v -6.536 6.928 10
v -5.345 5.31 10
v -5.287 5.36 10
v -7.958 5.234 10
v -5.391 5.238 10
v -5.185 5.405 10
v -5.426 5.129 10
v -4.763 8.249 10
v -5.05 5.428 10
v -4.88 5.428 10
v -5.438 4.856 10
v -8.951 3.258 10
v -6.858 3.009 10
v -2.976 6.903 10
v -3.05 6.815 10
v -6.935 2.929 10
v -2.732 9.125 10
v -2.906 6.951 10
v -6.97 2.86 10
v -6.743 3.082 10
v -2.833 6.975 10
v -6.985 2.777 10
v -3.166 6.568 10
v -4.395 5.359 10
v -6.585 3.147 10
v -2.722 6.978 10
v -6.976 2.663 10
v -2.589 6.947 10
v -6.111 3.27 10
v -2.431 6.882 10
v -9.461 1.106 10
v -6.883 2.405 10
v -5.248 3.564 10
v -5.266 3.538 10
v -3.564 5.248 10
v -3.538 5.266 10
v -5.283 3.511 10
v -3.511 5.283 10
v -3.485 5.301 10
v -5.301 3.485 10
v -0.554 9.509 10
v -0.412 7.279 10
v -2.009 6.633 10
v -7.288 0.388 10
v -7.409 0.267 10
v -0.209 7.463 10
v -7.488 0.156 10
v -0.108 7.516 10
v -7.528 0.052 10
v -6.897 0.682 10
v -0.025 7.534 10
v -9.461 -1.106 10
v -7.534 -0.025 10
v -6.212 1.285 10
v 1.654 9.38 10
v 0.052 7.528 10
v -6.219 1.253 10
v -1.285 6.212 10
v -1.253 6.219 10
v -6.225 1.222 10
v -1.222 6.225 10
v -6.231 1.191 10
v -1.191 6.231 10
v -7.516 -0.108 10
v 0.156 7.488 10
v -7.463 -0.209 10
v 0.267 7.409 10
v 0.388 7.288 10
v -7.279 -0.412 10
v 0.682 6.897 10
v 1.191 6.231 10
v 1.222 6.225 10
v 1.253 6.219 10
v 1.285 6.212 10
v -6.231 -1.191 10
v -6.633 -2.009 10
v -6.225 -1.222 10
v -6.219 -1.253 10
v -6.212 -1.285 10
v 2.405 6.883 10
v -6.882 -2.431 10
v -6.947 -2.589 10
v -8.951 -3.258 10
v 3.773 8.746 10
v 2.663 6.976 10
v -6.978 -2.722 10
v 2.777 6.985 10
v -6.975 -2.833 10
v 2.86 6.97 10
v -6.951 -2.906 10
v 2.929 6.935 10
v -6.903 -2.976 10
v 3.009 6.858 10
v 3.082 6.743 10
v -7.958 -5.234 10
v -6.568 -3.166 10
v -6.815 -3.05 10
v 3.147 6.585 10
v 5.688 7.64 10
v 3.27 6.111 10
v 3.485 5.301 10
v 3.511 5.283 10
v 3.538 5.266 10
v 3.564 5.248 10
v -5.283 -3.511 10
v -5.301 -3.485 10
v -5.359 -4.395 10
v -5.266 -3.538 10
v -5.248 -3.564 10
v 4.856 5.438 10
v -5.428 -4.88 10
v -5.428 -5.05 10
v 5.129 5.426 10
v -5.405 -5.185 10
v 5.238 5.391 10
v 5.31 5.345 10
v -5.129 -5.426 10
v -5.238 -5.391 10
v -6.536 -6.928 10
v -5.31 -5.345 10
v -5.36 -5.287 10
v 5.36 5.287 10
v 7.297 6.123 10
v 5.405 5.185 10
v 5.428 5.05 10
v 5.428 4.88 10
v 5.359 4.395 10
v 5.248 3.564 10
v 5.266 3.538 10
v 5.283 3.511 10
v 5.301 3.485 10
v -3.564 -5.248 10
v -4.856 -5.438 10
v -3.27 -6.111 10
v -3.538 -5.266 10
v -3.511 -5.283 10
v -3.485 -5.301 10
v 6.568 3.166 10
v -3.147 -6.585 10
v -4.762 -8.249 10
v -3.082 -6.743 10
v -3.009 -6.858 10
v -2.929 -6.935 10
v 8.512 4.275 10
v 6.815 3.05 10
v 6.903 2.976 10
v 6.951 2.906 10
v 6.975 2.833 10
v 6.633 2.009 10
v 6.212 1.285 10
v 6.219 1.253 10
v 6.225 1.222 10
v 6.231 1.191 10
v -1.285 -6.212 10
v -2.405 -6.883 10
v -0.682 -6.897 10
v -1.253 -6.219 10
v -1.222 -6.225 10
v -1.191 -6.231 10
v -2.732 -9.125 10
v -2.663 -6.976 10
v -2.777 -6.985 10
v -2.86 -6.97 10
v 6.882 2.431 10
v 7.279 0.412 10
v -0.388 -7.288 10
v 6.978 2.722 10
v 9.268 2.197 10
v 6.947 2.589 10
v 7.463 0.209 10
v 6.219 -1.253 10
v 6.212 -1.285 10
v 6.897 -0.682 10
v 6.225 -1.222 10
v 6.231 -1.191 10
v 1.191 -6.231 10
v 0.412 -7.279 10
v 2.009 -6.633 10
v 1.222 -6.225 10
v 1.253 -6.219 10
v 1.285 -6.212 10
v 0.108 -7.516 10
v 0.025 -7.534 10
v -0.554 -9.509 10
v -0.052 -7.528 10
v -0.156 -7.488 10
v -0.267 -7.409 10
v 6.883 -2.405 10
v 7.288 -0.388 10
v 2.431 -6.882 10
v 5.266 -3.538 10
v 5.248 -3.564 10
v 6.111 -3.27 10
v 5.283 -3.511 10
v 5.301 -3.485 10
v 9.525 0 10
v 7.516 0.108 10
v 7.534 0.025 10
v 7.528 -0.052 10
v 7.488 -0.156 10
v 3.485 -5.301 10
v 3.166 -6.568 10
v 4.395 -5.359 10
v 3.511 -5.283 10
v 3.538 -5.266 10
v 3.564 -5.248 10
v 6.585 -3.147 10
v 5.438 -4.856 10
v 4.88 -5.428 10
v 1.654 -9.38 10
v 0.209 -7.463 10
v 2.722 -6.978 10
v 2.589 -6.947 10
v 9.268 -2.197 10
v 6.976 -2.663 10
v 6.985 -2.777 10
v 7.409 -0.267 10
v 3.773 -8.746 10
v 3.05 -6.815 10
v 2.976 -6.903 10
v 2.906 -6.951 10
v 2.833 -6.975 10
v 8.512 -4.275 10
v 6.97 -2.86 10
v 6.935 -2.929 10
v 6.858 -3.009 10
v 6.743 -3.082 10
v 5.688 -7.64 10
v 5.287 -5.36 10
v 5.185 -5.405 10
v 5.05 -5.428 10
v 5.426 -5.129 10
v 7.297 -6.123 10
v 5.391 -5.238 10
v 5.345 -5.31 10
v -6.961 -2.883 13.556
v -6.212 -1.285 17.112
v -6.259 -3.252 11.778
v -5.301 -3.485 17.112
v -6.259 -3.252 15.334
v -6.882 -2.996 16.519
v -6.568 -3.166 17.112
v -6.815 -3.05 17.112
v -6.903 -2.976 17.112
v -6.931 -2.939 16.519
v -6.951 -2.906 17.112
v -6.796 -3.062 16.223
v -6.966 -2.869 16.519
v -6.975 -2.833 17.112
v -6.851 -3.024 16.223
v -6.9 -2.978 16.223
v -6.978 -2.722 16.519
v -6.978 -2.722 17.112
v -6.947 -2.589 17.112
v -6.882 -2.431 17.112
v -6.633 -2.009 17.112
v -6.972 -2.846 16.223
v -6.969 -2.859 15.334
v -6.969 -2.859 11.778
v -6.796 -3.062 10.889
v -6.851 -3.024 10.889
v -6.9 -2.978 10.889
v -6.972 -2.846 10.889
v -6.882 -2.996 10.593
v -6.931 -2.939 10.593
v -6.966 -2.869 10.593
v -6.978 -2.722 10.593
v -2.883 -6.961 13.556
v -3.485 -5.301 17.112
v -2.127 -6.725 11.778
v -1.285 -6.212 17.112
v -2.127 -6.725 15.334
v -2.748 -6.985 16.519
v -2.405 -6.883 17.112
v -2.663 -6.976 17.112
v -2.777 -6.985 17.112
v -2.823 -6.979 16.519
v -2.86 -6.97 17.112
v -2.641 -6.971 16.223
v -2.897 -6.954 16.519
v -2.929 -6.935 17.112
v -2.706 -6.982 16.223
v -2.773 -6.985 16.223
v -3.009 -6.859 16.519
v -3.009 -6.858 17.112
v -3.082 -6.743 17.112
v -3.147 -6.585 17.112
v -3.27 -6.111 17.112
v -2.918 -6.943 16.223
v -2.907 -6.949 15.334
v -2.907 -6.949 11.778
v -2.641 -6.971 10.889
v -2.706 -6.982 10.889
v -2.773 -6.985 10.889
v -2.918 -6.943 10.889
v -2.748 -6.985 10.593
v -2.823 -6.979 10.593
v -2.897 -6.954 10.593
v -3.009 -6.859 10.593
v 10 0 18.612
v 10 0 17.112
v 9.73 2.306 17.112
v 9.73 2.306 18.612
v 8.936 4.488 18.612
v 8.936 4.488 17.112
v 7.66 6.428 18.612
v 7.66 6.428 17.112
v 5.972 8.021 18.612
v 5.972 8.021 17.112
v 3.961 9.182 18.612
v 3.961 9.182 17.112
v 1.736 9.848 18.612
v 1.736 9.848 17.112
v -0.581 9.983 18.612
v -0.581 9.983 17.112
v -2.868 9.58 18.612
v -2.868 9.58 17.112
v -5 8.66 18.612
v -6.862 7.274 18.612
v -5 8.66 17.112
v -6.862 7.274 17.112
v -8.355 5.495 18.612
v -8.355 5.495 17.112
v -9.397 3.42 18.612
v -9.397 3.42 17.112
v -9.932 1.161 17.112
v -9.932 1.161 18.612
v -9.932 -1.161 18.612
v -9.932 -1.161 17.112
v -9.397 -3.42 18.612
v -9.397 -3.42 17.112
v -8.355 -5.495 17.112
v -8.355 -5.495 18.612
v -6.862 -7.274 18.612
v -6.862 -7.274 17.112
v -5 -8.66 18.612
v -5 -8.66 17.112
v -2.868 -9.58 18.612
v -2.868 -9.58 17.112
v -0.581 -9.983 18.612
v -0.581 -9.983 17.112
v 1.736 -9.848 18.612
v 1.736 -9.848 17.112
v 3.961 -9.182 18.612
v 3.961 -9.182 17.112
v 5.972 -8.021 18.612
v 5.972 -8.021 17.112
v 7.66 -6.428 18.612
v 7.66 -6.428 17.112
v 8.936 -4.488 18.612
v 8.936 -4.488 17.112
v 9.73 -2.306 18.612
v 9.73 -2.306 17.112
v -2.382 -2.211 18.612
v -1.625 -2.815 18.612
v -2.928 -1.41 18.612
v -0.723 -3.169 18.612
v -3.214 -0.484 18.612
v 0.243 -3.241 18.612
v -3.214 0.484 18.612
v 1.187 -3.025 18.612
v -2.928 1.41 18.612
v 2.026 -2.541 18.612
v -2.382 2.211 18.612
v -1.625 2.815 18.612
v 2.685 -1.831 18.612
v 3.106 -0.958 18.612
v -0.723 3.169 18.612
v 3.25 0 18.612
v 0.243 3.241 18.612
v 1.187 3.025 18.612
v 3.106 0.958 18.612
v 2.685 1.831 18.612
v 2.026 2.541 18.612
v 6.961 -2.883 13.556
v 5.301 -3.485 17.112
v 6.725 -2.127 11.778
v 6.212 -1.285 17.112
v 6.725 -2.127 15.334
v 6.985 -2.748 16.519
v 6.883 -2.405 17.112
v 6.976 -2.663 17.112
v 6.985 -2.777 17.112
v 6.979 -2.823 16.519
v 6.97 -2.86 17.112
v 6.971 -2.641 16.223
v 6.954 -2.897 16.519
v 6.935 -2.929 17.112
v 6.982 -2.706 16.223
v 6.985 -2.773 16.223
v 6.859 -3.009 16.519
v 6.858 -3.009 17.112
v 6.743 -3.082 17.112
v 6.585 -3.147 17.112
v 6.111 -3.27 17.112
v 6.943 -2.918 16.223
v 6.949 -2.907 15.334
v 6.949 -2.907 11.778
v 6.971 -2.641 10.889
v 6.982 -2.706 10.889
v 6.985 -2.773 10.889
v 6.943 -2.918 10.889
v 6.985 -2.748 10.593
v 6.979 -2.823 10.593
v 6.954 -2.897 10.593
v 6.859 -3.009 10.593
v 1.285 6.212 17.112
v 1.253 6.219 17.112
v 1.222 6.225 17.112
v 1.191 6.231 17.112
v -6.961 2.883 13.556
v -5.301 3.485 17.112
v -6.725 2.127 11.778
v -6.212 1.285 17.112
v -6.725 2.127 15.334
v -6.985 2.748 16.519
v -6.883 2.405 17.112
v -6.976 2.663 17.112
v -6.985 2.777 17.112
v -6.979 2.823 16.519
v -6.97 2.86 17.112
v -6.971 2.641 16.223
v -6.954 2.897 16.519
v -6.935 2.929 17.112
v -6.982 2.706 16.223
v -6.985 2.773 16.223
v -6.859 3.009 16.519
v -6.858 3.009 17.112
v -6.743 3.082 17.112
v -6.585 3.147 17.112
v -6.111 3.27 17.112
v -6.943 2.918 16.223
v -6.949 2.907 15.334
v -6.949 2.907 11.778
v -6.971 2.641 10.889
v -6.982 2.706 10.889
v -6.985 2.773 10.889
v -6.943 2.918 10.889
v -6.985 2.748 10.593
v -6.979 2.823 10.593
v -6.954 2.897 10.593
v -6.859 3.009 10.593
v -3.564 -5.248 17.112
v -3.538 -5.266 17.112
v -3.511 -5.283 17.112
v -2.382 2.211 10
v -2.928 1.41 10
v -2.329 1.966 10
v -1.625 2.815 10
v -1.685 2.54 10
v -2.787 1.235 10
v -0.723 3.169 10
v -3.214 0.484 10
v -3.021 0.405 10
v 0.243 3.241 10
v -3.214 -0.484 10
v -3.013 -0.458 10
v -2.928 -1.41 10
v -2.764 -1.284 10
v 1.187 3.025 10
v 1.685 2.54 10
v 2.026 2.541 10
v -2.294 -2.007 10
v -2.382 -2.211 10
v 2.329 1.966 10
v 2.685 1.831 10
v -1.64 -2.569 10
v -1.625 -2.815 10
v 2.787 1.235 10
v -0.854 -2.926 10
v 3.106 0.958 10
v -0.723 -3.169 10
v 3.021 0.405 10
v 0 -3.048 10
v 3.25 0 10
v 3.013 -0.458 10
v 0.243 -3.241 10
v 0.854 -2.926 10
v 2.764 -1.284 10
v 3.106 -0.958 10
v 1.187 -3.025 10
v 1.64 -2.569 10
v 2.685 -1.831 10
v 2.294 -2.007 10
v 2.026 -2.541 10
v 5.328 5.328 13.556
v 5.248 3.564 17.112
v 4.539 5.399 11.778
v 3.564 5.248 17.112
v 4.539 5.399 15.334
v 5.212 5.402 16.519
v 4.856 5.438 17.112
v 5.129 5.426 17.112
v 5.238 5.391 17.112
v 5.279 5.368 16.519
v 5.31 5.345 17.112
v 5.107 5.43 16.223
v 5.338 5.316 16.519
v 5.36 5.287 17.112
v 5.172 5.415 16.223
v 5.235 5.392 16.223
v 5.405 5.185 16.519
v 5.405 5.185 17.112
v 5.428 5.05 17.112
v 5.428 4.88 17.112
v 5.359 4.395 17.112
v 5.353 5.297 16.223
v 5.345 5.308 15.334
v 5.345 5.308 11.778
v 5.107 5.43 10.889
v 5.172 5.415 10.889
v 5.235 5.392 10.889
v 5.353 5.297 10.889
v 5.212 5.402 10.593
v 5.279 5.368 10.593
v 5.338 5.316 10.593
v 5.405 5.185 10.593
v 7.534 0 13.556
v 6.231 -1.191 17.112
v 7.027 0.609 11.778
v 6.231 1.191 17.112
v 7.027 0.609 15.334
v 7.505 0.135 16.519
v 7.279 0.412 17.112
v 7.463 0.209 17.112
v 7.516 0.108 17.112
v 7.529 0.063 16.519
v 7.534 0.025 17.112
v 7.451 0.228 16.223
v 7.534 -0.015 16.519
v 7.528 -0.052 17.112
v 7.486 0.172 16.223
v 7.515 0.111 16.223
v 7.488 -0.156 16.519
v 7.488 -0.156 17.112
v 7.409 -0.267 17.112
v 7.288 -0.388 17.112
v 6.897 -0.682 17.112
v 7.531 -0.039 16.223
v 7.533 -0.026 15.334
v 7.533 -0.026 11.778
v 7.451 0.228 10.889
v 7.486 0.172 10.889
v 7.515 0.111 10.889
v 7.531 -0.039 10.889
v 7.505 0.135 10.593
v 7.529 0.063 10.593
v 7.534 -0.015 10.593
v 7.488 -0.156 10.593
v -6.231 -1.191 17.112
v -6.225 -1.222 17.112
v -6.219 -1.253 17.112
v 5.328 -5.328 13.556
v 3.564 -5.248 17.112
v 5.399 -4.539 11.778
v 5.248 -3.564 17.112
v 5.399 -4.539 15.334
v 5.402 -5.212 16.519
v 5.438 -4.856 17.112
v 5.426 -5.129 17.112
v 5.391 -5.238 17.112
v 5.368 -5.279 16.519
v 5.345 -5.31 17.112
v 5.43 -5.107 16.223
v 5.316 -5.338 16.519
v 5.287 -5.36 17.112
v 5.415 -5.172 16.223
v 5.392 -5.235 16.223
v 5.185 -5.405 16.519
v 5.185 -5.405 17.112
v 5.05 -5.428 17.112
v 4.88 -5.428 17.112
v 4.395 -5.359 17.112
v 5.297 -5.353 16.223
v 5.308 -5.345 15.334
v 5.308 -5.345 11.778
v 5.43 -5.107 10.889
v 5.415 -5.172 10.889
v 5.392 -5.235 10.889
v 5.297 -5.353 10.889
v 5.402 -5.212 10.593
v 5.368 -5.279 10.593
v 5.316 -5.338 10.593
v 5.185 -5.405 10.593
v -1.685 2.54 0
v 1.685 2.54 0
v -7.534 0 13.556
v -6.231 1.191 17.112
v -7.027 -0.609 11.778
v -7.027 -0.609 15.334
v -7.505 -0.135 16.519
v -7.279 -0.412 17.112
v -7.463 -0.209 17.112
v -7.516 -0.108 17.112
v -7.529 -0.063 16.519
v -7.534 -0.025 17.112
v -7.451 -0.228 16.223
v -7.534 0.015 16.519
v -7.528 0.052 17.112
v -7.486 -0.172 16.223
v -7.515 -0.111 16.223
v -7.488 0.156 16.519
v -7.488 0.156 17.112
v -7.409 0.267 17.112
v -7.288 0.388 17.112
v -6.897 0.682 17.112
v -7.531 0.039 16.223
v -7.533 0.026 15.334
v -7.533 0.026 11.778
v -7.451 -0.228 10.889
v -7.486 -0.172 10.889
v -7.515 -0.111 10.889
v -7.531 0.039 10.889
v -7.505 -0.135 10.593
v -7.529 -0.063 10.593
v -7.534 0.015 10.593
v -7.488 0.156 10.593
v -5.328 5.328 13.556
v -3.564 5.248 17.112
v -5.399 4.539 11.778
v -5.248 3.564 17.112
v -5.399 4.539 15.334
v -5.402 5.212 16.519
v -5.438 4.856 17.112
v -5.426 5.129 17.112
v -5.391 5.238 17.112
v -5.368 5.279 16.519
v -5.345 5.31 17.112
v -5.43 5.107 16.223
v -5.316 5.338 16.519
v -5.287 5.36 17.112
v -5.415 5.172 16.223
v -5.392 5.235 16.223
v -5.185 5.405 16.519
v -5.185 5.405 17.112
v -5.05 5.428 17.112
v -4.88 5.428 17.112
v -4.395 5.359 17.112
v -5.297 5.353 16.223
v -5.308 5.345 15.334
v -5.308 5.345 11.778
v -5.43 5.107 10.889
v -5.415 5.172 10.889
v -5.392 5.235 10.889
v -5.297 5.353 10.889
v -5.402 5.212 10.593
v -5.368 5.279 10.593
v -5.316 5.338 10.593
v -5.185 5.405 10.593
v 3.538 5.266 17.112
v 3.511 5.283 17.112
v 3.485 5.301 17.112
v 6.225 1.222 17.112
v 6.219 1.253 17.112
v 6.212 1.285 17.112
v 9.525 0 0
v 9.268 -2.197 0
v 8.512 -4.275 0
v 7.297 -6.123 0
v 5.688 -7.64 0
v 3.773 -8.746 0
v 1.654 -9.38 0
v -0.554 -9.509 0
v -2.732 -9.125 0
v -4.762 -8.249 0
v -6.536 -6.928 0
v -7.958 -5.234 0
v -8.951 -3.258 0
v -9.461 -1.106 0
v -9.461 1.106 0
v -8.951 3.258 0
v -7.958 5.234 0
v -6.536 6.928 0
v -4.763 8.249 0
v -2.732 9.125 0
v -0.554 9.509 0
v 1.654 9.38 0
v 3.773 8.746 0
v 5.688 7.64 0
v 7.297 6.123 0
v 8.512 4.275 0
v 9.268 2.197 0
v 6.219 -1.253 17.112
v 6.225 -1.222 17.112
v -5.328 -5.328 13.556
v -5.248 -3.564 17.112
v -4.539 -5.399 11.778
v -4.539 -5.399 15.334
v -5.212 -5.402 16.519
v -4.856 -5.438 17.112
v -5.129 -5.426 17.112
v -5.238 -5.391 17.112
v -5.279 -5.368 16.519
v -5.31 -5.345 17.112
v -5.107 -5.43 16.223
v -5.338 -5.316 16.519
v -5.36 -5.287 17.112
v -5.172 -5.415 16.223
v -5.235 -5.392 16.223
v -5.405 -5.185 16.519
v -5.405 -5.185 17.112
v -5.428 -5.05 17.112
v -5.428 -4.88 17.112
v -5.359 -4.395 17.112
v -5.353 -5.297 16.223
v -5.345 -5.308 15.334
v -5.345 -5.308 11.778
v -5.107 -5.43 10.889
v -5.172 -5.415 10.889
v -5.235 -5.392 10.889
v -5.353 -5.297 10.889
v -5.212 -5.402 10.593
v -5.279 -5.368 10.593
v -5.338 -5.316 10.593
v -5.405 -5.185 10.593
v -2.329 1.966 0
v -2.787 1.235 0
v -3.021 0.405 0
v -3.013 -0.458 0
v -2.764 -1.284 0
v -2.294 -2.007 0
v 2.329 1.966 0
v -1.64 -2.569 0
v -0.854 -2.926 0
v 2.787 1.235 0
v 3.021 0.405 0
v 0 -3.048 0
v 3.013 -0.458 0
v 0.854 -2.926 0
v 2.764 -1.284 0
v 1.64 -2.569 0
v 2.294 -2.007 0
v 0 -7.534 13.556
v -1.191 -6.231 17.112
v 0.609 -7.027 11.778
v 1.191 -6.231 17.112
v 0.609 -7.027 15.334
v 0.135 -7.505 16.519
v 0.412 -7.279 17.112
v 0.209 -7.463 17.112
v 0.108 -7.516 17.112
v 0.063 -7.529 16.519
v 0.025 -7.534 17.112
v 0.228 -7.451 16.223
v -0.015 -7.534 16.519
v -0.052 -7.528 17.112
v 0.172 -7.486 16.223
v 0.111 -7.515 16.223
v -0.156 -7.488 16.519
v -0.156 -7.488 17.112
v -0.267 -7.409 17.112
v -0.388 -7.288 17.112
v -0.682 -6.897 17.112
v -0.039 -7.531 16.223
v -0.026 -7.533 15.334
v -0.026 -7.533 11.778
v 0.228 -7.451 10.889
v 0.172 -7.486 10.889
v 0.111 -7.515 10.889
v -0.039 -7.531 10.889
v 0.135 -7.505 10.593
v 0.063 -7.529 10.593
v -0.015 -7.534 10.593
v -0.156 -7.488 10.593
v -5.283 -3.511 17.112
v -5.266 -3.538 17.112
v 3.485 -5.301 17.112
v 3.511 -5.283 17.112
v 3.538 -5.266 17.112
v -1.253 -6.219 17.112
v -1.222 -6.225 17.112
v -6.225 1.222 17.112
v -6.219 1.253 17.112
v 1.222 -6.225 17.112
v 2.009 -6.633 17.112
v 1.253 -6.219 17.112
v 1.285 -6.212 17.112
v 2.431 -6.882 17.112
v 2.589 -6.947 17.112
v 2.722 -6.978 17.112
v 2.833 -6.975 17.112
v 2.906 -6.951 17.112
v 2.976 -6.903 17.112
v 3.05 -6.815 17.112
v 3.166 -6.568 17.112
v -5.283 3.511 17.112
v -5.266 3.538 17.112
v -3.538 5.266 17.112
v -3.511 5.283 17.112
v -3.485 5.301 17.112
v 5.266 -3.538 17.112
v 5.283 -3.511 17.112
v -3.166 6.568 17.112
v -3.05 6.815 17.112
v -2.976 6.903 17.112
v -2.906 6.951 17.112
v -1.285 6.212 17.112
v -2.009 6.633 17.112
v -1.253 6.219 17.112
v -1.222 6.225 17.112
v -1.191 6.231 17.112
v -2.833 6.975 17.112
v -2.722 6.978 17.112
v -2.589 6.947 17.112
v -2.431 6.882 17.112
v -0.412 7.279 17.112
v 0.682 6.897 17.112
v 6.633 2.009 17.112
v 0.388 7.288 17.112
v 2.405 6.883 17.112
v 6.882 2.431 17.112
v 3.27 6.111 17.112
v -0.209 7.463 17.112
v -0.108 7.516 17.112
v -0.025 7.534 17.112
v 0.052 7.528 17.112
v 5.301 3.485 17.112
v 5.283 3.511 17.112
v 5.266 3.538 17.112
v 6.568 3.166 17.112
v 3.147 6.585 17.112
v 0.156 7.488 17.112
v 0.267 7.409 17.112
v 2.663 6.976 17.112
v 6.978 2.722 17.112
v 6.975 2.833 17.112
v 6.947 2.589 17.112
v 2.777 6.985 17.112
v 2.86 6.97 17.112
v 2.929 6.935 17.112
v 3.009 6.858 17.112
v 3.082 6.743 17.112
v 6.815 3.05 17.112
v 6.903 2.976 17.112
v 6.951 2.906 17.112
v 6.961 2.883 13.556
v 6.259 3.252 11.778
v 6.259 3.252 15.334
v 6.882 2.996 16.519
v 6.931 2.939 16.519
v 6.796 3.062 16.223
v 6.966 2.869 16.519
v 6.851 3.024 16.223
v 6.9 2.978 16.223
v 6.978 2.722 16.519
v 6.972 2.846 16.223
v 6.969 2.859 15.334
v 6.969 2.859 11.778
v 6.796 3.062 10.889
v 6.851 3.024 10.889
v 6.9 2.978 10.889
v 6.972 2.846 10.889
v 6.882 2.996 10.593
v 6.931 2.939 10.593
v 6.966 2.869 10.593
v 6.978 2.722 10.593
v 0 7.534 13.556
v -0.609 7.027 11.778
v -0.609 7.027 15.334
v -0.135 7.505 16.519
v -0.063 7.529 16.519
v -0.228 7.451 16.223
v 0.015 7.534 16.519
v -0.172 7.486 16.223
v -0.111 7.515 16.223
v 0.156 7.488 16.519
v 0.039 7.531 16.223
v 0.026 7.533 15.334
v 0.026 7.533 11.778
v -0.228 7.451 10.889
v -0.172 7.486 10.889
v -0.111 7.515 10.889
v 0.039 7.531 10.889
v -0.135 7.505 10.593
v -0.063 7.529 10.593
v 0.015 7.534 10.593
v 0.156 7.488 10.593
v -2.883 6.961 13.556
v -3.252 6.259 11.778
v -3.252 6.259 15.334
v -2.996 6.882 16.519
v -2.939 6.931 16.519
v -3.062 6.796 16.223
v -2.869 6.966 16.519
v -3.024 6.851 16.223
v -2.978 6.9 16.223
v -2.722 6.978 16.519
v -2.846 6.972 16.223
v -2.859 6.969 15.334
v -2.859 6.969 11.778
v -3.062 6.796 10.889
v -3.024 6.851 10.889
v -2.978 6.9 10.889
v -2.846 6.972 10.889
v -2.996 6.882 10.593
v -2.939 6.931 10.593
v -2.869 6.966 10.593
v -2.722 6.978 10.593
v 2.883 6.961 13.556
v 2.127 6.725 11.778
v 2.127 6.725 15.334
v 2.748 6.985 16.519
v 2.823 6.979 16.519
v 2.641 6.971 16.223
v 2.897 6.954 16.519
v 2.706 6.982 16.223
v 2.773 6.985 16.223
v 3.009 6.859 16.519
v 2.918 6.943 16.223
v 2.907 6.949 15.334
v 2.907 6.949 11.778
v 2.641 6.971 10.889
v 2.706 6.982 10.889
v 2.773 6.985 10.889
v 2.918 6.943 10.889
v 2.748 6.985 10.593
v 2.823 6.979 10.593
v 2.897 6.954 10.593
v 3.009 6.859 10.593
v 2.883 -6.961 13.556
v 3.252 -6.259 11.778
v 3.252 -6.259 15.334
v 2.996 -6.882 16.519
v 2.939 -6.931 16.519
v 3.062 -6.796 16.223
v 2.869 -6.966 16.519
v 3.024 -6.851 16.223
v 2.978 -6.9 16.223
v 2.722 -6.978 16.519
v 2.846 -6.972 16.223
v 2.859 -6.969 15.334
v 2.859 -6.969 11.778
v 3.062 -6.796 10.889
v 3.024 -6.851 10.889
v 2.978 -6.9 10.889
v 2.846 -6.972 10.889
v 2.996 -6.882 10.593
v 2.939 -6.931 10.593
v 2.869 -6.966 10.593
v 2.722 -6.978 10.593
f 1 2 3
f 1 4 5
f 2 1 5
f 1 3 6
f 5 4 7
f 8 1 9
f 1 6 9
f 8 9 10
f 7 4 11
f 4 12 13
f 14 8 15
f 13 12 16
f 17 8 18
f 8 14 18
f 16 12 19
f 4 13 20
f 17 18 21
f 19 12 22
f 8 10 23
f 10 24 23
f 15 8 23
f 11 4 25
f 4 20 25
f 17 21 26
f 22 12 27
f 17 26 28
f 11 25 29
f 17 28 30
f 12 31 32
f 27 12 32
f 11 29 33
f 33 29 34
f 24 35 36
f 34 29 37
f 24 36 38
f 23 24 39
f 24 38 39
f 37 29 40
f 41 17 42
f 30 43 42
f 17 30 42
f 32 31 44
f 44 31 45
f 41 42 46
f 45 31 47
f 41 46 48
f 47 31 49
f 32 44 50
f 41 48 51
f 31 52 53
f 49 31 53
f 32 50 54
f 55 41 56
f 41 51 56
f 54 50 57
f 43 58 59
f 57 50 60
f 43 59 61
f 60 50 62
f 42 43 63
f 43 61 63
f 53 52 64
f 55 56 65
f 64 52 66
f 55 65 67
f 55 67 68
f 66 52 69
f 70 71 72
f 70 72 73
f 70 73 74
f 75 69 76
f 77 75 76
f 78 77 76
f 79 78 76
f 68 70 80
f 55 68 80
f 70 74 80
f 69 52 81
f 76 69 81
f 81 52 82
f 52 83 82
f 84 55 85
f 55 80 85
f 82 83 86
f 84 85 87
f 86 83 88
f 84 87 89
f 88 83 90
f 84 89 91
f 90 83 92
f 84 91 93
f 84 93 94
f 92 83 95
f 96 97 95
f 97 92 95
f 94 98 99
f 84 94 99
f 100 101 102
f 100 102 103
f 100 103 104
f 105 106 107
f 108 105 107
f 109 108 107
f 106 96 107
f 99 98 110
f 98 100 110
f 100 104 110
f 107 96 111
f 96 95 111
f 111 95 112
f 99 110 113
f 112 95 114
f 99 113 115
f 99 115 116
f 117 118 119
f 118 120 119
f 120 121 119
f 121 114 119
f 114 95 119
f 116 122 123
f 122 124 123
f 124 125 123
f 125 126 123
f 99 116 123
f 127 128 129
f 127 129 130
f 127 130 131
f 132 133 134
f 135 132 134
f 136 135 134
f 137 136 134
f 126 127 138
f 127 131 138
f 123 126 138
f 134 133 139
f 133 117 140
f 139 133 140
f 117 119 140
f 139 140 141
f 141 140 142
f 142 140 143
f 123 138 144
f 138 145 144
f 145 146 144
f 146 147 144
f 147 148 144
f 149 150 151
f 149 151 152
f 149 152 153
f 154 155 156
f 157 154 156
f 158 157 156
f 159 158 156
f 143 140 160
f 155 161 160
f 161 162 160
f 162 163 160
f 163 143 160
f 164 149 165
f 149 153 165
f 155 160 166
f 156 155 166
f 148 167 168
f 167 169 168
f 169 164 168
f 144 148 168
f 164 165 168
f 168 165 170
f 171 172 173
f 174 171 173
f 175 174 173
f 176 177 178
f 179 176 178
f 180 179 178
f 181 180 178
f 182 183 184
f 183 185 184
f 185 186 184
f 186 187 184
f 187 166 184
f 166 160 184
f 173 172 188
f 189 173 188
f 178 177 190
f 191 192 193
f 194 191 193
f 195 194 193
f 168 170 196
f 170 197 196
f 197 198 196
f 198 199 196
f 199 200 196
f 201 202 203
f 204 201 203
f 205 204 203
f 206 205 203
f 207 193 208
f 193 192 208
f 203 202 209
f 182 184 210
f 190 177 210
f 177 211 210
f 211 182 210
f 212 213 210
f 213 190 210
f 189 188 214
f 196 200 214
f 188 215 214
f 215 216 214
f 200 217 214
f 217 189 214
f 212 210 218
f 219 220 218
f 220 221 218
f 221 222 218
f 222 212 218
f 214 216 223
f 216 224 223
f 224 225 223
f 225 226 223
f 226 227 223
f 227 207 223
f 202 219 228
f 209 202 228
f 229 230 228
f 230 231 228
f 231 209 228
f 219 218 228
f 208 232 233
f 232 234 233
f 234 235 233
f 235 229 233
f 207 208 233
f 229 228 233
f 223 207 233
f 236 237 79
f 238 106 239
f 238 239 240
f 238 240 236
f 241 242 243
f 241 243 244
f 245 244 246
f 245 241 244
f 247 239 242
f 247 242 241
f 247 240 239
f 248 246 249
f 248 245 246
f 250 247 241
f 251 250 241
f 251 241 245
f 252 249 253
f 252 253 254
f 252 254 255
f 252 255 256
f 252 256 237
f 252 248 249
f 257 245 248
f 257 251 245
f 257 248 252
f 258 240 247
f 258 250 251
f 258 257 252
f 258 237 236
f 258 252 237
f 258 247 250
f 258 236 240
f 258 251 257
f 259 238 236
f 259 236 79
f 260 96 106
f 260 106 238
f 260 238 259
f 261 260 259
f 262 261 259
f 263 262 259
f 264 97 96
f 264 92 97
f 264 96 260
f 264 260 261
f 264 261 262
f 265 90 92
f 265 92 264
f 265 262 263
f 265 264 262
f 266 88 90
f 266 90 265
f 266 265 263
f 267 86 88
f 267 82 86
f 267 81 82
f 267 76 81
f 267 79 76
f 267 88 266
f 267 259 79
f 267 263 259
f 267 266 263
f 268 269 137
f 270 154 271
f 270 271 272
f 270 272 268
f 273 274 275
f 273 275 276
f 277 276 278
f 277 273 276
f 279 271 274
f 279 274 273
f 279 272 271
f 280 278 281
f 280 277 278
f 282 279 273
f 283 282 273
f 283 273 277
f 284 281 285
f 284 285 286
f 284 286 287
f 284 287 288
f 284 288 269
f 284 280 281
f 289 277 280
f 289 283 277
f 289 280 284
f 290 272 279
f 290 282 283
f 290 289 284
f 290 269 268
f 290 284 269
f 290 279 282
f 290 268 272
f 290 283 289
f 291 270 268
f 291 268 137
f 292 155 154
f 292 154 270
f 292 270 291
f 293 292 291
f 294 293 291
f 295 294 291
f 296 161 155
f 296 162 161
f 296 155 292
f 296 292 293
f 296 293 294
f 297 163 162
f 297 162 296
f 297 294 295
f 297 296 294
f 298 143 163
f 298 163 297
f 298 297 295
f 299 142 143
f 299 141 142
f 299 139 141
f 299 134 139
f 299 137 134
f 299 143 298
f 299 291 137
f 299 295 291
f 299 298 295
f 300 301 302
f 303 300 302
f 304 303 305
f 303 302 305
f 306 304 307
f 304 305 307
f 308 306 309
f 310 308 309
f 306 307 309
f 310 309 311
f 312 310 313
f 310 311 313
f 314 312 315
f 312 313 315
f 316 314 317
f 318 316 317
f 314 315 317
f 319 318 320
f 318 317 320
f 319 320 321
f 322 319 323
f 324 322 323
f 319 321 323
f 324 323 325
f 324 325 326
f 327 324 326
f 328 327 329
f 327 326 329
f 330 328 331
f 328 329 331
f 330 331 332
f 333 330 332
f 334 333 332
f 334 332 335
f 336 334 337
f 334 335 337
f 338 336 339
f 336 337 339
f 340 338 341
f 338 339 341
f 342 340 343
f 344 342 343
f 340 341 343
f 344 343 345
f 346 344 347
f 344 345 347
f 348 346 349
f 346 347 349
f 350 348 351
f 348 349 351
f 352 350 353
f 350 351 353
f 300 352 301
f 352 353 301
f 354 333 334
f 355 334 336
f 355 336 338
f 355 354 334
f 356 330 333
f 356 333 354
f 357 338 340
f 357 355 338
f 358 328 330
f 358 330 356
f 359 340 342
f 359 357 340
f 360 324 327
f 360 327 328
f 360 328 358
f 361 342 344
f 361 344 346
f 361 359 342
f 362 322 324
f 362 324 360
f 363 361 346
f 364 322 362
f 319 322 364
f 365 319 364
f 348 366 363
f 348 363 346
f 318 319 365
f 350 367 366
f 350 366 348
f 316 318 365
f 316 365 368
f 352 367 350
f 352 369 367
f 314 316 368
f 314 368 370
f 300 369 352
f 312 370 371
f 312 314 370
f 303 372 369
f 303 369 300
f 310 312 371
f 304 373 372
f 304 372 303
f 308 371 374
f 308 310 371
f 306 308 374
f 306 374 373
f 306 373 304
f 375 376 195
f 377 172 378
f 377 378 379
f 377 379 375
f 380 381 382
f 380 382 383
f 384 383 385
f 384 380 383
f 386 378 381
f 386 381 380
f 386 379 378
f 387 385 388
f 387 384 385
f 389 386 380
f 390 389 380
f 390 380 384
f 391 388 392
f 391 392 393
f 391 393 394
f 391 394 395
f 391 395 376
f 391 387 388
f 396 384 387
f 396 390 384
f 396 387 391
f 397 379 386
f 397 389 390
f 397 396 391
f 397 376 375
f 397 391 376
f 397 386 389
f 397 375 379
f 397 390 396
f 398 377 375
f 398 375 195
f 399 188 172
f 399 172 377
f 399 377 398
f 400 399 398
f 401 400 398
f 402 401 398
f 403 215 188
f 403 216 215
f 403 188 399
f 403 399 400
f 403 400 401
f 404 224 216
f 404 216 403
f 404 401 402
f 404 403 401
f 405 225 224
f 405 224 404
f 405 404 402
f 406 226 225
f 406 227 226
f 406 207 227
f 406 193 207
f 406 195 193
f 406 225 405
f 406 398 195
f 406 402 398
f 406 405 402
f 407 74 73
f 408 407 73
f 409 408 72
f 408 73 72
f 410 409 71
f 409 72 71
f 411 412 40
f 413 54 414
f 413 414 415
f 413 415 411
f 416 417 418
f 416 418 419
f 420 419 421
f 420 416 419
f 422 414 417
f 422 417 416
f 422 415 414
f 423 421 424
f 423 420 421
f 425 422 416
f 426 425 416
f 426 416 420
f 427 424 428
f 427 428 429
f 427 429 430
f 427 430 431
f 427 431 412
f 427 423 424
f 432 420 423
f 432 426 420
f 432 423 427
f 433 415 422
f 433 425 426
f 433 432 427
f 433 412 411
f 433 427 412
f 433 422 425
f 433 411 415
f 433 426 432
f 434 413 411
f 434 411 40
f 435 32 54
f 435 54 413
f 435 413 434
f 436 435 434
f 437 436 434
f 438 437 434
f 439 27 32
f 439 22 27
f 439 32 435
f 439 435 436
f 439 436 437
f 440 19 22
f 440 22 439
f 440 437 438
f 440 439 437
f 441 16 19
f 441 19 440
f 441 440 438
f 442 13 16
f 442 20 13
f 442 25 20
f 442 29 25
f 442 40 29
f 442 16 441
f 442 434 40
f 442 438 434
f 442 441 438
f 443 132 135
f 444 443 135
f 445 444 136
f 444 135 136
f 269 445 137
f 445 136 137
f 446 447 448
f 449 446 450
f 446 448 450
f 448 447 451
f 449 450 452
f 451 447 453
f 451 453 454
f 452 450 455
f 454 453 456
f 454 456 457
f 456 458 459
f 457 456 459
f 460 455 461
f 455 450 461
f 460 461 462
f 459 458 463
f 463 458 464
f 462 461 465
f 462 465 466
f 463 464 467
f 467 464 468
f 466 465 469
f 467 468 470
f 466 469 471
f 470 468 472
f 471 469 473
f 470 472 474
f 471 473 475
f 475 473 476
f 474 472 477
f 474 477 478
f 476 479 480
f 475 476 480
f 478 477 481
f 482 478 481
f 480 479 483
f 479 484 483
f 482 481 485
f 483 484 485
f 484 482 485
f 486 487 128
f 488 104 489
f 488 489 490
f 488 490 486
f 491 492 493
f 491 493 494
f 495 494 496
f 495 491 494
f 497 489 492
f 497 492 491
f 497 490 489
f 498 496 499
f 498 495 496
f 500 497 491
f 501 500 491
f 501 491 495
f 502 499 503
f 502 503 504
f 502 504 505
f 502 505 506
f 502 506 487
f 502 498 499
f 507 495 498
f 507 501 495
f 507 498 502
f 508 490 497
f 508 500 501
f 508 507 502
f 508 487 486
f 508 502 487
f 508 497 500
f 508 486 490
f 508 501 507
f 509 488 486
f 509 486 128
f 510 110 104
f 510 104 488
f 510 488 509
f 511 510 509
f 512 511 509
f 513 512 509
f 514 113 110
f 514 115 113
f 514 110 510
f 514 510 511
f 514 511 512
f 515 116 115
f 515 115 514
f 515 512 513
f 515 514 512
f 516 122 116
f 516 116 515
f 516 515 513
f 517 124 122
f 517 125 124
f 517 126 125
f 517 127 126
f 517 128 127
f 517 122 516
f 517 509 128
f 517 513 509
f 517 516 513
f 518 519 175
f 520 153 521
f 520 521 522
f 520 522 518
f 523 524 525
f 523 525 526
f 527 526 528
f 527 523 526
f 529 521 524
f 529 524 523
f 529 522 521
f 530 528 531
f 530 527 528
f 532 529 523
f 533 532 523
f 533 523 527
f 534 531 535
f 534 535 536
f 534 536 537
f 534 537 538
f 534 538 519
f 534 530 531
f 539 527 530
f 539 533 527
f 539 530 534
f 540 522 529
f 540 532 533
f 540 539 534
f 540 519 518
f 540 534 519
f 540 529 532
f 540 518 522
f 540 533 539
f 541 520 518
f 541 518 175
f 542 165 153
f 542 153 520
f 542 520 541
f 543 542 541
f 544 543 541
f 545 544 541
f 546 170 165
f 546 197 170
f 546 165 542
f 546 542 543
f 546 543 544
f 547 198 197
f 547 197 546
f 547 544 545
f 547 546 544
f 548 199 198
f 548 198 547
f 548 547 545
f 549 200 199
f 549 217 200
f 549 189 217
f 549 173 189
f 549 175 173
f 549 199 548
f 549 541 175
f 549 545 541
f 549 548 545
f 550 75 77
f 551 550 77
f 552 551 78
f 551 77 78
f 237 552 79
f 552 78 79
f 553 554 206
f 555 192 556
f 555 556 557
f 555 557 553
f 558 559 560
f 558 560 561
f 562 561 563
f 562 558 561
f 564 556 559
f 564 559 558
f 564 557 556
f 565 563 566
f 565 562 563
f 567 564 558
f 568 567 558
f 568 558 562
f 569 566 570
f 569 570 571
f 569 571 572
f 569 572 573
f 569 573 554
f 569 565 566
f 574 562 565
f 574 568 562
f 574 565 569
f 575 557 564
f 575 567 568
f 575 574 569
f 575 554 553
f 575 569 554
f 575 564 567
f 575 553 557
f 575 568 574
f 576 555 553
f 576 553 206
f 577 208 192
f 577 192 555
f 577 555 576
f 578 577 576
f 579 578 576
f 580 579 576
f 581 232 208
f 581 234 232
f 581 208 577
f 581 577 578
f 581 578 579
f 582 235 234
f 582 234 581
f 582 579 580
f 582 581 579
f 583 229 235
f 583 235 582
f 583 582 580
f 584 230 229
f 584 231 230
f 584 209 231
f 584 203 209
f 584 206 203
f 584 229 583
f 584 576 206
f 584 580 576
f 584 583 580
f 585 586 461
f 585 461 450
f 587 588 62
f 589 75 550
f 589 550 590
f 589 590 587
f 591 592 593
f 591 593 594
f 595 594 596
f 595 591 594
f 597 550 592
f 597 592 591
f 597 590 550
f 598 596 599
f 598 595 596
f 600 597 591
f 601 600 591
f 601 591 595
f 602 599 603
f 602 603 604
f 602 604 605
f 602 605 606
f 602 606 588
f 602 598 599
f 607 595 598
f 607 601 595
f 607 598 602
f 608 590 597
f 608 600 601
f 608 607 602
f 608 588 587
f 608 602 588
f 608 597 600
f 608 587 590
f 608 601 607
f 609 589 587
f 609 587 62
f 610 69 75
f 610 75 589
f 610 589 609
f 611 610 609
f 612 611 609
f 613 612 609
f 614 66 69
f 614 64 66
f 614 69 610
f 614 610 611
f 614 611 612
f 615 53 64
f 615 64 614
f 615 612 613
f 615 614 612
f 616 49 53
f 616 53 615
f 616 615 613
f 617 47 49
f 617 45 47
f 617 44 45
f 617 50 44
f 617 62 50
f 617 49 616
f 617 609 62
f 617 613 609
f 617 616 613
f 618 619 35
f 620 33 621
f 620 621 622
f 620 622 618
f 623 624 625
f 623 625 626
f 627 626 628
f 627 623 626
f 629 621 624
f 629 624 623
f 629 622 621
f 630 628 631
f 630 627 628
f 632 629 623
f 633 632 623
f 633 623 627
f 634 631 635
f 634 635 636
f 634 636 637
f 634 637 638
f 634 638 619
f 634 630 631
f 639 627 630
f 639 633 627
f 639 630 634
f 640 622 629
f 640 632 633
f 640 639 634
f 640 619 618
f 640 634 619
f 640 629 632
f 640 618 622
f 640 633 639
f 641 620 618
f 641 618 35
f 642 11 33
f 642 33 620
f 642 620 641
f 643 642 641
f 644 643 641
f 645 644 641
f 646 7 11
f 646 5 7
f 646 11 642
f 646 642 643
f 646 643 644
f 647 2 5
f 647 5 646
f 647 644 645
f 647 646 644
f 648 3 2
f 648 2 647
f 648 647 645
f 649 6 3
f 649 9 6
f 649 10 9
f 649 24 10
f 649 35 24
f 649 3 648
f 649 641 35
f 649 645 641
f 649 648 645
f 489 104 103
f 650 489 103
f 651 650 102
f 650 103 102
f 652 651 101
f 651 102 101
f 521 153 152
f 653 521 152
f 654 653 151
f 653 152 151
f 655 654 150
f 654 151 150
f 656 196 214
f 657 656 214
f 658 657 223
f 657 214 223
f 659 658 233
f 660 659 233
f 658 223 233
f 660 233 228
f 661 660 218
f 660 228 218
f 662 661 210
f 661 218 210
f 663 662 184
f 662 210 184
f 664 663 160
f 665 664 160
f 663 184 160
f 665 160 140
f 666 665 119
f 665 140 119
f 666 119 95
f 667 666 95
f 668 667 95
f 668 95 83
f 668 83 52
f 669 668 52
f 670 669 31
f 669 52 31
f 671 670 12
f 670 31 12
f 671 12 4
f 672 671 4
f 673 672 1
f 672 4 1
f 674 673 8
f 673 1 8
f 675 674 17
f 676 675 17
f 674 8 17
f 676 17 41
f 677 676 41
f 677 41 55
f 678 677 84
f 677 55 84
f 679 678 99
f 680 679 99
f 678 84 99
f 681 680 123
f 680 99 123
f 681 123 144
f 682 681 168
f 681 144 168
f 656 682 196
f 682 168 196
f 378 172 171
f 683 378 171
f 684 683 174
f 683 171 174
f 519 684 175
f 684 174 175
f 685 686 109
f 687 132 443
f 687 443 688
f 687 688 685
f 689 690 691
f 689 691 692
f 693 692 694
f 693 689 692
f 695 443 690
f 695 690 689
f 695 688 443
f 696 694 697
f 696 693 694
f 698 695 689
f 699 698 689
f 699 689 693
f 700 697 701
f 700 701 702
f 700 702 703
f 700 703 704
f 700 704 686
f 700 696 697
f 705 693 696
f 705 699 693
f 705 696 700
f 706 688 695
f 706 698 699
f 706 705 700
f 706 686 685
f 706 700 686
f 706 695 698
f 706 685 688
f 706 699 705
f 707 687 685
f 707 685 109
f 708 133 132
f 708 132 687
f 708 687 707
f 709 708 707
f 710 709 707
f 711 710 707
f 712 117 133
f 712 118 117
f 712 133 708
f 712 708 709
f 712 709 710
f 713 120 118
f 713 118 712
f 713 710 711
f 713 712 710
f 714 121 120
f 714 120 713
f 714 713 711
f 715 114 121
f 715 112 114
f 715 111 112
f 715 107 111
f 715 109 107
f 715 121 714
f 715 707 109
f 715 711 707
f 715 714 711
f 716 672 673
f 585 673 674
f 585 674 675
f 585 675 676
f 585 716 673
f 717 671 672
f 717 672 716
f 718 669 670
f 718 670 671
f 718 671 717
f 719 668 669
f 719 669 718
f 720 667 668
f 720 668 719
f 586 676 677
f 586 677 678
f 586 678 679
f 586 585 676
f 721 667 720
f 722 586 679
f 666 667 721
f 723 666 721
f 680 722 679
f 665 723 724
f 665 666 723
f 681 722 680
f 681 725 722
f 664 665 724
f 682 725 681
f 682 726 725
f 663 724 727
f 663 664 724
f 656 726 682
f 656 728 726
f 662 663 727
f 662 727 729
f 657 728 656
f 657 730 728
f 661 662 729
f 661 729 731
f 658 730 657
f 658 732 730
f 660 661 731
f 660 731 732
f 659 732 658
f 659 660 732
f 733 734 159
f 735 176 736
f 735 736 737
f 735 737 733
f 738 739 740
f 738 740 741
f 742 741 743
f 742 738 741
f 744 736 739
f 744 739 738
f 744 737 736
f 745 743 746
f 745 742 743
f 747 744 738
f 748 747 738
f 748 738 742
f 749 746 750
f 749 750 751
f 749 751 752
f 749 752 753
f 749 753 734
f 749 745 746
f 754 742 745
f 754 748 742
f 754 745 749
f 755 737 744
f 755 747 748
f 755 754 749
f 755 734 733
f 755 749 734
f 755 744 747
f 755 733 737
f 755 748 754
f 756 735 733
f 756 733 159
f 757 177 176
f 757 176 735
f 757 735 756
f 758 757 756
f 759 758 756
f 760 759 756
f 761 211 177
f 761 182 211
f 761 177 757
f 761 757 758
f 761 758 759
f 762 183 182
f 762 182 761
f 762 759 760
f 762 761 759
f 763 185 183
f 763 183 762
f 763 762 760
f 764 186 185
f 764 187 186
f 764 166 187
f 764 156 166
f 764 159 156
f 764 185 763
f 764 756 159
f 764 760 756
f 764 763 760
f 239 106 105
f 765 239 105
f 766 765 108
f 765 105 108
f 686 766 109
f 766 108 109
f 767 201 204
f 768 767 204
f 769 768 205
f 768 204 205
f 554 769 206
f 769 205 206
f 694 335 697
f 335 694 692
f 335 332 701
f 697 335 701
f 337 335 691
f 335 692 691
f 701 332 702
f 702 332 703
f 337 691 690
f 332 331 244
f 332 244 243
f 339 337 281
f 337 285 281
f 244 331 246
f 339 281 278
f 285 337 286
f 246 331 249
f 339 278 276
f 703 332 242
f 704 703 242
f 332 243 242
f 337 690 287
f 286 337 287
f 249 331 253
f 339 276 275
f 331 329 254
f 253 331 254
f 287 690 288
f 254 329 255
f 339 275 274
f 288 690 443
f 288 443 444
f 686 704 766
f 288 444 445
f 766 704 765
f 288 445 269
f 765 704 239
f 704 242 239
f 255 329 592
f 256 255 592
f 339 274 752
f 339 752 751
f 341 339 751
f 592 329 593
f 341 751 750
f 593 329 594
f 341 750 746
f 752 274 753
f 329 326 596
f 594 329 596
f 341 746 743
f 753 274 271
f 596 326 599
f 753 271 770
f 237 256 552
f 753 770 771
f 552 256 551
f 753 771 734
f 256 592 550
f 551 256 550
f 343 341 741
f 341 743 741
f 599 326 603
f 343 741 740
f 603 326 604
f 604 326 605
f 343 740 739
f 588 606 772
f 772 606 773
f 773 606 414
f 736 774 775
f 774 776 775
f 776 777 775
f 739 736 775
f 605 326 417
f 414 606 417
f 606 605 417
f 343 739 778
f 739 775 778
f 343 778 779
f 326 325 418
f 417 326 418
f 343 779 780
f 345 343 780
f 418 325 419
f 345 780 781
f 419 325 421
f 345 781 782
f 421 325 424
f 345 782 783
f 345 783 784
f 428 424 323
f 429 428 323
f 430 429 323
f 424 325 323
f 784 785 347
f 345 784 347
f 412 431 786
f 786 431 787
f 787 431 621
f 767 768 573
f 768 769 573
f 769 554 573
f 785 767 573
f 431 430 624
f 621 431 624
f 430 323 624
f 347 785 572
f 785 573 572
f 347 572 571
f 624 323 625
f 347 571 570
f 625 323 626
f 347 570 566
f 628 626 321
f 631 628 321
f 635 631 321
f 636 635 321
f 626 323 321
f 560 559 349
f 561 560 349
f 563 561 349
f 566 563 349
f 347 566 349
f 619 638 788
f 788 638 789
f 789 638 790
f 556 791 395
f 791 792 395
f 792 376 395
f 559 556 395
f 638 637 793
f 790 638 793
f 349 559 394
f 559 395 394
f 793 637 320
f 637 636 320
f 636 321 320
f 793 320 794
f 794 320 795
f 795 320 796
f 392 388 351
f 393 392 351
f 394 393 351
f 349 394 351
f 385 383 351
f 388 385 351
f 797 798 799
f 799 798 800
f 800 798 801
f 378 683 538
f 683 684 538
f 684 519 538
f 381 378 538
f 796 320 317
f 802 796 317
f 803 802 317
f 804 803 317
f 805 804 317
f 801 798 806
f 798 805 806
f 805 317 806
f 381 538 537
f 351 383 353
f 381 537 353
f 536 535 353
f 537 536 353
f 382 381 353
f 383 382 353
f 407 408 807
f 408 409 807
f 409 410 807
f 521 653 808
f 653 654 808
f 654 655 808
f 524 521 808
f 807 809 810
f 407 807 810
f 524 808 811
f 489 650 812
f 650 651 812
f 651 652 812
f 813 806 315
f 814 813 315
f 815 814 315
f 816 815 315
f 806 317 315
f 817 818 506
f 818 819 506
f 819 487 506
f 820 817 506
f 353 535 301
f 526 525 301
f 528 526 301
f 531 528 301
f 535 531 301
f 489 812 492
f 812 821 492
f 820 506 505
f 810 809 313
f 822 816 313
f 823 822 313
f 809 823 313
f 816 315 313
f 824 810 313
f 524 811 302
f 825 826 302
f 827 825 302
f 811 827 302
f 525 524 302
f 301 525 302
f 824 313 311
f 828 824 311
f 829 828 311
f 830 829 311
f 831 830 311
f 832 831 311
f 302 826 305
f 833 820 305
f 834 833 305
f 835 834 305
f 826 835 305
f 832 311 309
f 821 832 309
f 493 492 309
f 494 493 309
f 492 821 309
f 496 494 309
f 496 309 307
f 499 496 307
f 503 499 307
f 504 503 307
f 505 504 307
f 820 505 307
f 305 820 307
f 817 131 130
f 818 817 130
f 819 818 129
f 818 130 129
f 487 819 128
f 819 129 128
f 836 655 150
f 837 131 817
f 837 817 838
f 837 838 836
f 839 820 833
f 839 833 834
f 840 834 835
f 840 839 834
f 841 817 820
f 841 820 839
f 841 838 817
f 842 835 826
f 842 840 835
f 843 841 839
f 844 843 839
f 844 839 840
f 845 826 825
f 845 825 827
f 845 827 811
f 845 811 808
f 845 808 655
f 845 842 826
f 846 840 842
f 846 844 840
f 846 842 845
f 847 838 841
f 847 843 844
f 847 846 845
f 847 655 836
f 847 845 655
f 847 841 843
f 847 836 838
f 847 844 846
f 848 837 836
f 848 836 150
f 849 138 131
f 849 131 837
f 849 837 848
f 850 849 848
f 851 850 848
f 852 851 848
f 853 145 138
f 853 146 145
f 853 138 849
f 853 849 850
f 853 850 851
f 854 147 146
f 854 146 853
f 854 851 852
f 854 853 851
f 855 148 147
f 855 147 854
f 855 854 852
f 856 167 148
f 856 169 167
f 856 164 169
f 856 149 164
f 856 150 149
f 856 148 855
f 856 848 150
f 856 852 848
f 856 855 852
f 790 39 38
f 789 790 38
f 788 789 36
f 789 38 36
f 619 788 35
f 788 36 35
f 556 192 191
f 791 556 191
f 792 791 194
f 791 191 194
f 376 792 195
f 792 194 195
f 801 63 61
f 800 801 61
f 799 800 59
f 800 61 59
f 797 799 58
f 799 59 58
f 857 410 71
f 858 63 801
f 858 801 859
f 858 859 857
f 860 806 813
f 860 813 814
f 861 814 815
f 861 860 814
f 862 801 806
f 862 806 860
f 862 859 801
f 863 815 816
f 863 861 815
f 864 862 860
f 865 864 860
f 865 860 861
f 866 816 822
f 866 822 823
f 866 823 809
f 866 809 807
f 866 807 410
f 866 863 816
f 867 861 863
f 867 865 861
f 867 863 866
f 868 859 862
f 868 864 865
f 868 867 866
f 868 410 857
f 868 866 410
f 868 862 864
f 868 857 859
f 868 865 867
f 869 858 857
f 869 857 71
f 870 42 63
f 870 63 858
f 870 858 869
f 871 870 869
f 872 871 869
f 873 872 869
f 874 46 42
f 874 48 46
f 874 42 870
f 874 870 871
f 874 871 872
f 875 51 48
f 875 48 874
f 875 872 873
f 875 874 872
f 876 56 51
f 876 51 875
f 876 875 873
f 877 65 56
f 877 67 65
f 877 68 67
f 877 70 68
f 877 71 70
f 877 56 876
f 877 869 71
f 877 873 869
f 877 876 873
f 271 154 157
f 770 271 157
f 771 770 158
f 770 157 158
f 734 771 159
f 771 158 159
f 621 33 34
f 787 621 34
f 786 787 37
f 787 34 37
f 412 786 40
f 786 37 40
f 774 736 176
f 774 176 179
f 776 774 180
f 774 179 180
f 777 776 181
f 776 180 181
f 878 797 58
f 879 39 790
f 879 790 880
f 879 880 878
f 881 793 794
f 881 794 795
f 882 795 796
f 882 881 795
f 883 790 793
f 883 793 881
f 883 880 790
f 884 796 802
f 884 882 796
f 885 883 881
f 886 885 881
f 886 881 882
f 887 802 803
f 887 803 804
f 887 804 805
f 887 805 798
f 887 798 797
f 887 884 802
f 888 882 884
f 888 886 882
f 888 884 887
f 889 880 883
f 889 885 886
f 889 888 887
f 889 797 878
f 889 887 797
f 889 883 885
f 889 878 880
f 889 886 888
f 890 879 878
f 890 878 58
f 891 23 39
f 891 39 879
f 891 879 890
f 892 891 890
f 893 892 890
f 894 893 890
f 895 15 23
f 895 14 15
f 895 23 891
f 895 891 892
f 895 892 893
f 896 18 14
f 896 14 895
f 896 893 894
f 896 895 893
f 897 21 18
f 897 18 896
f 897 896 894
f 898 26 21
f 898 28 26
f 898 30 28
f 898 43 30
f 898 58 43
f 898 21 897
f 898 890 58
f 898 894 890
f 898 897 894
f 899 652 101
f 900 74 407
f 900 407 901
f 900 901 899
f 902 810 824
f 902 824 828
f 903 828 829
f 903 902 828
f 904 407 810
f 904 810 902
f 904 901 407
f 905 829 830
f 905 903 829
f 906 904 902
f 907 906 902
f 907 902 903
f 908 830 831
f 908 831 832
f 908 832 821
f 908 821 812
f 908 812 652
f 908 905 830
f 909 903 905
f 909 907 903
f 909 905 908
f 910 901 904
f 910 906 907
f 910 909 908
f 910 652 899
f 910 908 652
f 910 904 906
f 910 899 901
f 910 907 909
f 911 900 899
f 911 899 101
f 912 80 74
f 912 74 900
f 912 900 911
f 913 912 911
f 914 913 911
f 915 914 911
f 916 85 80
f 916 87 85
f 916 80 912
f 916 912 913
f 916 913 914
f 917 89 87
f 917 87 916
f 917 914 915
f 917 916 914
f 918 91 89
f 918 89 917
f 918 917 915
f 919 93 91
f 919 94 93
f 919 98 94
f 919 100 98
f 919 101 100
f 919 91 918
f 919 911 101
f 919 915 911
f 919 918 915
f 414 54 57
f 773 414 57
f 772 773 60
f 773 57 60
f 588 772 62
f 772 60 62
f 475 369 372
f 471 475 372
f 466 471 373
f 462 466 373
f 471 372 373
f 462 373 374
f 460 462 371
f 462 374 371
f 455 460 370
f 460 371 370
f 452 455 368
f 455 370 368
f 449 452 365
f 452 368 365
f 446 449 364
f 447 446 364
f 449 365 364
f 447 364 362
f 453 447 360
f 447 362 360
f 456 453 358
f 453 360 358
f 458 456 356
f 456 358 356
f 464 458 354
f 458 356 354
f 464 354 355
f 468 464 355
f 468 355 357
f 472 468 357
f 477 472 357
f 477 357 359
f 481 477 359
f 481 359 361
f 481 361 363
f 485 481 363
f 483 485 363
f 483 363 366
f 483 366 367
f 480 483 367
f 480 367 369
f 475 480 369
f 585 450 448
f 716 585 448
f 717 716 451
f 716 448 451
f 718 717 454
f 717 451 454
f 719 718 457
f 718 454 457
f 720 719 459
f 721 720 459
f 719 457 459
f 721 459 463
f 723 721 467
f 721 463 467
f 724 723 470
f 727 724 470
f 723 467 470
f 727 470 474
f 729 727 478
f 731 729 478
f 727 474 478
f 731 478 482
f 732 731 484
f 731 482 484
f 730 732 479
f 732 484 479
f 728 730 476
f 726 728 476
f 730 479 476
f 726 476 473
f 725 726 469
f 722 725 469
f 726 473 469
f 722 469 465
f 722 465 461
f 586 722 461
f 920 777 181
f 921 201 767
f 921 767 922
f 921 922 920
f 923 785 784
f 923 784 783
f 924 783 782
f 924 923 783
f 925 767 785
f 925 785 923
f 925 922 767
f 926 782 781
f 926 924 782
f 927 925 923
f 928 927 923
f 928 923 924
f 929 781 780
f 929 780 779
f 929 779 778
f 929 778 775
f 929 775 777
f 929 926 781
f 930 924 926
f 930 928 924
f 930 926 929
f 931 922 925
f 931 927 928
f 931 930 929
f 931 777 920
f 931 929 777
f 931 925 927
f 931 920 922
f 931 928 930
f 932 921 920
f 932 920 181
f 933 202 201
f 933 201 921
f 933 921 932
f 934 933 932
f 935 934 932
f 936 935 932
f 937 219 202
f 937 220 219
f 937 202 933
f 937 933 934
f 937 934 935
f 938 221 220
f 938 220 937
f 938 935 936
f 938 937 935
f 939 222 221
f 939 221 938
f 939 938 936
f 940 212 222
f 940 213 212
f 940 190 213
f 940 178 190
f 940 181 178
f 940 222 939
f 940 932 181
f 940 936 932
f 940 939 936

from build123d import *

# Parameters (mm, degrees)
F0_R      = 4.0386
F1_DEPTH  = 10
F3_DEPTH  = 7.112
F5_COUNT  = 16
F6_R      = 10
F7_DEPTH  = 1.5
F8_R      = 3.25
F9_DEPTH  = 18.613
F10_R     = 9.525
F11_DEPTH = 10
F13_DEPTH = 18.613


with BuildPart() as f1:
    # F0 (on Top) → F1 (new body)
    with BuildSketch(Plane.XY):
        Circle(F0_R)
    extrude(amount=F1_DEPTH)

    # F2 (on face) → F3 (join)
    with BuildSketch(Plane.XY.offset(10)):
        with BuildLine():
            ThreePointArc((-1.190625, 6.2310172662), (-4.0429034566, -4.8885678581), (6.34375, 0))
            ThreePointArc((6.34375, 0), (4.8885678581, 4.0429034566), (1.190625, 6.2310172662))
            ThreePointArc((1.190625, 6.2310172662), (0, 6.34375), (-1.190625, 6.2310172662))
        make_face()
        with BuildLine():
            ThreePointArc((-1.190625, 6.2310172662), (0, 6.34375), (1.190625, 6.2310172662))
            add(Edge.make_bspline(
                [(-1.190625, 6.2310172662), (-0.8188678232, 6.6074045675), (0.0037249265, 8.4795309027), (0.8114179702, 6.571033627), (1.190625, 6.2310172662)],
                knots=[0, 0, 0, 0, 0.5, 1, 1, 1, 1], degree=3))
        make_face()
    extrude(amount=F3_DEPTH)

    # F5: F1 ×16 about axis
    f5_axis = Axis((0, 0, 16.2677839398), (0, 0, 1))


with BuildPart() as f1_1:
    add(f1.part)
    for i in range(1, F5_COUNT):
        add(f1.part.rotate(f5_axis, i * 360 / F5_COUNT))

    # F6 (on face) → F7 (join)
    with BuildSketch(Plane.XY.offset(17.112)):
        Circle(F6_R)
    extrude(amount=F7_DEPTH)

    # F8 (on face) → F9 (cut, through all)
    with BuildSketch(Plane.XY.offset(18.612)):
        Circle(F8_R)
    extrude(amount=-F9_DEPTH, mode=Mode.SUBTRACT)

    # F10 (on face) → F11 (join, through all)
    with BuildSketch(Plane(origin=(0, 0, 10), x_dir=(1, 0, 0), z_dir=(0, 0, -1))):
        Circle(F10_R)
    extrude(amount=F11_DEPTH)

    # F12 (on face) → F13 (cut, through all)
    with BuildSketch(Plane.XY.offset(18.612)):
        with BuildLine():
            Line((1.6848453935, 2.54), (-1.6848453935, 2.54))
            ThreePointArc((-1.6848453935, 2.54), (0, -3.048), (1.6848453935, 2.54))
        make_face()
    extrude(amount=-F13_DEPTH, mode=Mode.SUBTRACT)


solid = f1_1.part
